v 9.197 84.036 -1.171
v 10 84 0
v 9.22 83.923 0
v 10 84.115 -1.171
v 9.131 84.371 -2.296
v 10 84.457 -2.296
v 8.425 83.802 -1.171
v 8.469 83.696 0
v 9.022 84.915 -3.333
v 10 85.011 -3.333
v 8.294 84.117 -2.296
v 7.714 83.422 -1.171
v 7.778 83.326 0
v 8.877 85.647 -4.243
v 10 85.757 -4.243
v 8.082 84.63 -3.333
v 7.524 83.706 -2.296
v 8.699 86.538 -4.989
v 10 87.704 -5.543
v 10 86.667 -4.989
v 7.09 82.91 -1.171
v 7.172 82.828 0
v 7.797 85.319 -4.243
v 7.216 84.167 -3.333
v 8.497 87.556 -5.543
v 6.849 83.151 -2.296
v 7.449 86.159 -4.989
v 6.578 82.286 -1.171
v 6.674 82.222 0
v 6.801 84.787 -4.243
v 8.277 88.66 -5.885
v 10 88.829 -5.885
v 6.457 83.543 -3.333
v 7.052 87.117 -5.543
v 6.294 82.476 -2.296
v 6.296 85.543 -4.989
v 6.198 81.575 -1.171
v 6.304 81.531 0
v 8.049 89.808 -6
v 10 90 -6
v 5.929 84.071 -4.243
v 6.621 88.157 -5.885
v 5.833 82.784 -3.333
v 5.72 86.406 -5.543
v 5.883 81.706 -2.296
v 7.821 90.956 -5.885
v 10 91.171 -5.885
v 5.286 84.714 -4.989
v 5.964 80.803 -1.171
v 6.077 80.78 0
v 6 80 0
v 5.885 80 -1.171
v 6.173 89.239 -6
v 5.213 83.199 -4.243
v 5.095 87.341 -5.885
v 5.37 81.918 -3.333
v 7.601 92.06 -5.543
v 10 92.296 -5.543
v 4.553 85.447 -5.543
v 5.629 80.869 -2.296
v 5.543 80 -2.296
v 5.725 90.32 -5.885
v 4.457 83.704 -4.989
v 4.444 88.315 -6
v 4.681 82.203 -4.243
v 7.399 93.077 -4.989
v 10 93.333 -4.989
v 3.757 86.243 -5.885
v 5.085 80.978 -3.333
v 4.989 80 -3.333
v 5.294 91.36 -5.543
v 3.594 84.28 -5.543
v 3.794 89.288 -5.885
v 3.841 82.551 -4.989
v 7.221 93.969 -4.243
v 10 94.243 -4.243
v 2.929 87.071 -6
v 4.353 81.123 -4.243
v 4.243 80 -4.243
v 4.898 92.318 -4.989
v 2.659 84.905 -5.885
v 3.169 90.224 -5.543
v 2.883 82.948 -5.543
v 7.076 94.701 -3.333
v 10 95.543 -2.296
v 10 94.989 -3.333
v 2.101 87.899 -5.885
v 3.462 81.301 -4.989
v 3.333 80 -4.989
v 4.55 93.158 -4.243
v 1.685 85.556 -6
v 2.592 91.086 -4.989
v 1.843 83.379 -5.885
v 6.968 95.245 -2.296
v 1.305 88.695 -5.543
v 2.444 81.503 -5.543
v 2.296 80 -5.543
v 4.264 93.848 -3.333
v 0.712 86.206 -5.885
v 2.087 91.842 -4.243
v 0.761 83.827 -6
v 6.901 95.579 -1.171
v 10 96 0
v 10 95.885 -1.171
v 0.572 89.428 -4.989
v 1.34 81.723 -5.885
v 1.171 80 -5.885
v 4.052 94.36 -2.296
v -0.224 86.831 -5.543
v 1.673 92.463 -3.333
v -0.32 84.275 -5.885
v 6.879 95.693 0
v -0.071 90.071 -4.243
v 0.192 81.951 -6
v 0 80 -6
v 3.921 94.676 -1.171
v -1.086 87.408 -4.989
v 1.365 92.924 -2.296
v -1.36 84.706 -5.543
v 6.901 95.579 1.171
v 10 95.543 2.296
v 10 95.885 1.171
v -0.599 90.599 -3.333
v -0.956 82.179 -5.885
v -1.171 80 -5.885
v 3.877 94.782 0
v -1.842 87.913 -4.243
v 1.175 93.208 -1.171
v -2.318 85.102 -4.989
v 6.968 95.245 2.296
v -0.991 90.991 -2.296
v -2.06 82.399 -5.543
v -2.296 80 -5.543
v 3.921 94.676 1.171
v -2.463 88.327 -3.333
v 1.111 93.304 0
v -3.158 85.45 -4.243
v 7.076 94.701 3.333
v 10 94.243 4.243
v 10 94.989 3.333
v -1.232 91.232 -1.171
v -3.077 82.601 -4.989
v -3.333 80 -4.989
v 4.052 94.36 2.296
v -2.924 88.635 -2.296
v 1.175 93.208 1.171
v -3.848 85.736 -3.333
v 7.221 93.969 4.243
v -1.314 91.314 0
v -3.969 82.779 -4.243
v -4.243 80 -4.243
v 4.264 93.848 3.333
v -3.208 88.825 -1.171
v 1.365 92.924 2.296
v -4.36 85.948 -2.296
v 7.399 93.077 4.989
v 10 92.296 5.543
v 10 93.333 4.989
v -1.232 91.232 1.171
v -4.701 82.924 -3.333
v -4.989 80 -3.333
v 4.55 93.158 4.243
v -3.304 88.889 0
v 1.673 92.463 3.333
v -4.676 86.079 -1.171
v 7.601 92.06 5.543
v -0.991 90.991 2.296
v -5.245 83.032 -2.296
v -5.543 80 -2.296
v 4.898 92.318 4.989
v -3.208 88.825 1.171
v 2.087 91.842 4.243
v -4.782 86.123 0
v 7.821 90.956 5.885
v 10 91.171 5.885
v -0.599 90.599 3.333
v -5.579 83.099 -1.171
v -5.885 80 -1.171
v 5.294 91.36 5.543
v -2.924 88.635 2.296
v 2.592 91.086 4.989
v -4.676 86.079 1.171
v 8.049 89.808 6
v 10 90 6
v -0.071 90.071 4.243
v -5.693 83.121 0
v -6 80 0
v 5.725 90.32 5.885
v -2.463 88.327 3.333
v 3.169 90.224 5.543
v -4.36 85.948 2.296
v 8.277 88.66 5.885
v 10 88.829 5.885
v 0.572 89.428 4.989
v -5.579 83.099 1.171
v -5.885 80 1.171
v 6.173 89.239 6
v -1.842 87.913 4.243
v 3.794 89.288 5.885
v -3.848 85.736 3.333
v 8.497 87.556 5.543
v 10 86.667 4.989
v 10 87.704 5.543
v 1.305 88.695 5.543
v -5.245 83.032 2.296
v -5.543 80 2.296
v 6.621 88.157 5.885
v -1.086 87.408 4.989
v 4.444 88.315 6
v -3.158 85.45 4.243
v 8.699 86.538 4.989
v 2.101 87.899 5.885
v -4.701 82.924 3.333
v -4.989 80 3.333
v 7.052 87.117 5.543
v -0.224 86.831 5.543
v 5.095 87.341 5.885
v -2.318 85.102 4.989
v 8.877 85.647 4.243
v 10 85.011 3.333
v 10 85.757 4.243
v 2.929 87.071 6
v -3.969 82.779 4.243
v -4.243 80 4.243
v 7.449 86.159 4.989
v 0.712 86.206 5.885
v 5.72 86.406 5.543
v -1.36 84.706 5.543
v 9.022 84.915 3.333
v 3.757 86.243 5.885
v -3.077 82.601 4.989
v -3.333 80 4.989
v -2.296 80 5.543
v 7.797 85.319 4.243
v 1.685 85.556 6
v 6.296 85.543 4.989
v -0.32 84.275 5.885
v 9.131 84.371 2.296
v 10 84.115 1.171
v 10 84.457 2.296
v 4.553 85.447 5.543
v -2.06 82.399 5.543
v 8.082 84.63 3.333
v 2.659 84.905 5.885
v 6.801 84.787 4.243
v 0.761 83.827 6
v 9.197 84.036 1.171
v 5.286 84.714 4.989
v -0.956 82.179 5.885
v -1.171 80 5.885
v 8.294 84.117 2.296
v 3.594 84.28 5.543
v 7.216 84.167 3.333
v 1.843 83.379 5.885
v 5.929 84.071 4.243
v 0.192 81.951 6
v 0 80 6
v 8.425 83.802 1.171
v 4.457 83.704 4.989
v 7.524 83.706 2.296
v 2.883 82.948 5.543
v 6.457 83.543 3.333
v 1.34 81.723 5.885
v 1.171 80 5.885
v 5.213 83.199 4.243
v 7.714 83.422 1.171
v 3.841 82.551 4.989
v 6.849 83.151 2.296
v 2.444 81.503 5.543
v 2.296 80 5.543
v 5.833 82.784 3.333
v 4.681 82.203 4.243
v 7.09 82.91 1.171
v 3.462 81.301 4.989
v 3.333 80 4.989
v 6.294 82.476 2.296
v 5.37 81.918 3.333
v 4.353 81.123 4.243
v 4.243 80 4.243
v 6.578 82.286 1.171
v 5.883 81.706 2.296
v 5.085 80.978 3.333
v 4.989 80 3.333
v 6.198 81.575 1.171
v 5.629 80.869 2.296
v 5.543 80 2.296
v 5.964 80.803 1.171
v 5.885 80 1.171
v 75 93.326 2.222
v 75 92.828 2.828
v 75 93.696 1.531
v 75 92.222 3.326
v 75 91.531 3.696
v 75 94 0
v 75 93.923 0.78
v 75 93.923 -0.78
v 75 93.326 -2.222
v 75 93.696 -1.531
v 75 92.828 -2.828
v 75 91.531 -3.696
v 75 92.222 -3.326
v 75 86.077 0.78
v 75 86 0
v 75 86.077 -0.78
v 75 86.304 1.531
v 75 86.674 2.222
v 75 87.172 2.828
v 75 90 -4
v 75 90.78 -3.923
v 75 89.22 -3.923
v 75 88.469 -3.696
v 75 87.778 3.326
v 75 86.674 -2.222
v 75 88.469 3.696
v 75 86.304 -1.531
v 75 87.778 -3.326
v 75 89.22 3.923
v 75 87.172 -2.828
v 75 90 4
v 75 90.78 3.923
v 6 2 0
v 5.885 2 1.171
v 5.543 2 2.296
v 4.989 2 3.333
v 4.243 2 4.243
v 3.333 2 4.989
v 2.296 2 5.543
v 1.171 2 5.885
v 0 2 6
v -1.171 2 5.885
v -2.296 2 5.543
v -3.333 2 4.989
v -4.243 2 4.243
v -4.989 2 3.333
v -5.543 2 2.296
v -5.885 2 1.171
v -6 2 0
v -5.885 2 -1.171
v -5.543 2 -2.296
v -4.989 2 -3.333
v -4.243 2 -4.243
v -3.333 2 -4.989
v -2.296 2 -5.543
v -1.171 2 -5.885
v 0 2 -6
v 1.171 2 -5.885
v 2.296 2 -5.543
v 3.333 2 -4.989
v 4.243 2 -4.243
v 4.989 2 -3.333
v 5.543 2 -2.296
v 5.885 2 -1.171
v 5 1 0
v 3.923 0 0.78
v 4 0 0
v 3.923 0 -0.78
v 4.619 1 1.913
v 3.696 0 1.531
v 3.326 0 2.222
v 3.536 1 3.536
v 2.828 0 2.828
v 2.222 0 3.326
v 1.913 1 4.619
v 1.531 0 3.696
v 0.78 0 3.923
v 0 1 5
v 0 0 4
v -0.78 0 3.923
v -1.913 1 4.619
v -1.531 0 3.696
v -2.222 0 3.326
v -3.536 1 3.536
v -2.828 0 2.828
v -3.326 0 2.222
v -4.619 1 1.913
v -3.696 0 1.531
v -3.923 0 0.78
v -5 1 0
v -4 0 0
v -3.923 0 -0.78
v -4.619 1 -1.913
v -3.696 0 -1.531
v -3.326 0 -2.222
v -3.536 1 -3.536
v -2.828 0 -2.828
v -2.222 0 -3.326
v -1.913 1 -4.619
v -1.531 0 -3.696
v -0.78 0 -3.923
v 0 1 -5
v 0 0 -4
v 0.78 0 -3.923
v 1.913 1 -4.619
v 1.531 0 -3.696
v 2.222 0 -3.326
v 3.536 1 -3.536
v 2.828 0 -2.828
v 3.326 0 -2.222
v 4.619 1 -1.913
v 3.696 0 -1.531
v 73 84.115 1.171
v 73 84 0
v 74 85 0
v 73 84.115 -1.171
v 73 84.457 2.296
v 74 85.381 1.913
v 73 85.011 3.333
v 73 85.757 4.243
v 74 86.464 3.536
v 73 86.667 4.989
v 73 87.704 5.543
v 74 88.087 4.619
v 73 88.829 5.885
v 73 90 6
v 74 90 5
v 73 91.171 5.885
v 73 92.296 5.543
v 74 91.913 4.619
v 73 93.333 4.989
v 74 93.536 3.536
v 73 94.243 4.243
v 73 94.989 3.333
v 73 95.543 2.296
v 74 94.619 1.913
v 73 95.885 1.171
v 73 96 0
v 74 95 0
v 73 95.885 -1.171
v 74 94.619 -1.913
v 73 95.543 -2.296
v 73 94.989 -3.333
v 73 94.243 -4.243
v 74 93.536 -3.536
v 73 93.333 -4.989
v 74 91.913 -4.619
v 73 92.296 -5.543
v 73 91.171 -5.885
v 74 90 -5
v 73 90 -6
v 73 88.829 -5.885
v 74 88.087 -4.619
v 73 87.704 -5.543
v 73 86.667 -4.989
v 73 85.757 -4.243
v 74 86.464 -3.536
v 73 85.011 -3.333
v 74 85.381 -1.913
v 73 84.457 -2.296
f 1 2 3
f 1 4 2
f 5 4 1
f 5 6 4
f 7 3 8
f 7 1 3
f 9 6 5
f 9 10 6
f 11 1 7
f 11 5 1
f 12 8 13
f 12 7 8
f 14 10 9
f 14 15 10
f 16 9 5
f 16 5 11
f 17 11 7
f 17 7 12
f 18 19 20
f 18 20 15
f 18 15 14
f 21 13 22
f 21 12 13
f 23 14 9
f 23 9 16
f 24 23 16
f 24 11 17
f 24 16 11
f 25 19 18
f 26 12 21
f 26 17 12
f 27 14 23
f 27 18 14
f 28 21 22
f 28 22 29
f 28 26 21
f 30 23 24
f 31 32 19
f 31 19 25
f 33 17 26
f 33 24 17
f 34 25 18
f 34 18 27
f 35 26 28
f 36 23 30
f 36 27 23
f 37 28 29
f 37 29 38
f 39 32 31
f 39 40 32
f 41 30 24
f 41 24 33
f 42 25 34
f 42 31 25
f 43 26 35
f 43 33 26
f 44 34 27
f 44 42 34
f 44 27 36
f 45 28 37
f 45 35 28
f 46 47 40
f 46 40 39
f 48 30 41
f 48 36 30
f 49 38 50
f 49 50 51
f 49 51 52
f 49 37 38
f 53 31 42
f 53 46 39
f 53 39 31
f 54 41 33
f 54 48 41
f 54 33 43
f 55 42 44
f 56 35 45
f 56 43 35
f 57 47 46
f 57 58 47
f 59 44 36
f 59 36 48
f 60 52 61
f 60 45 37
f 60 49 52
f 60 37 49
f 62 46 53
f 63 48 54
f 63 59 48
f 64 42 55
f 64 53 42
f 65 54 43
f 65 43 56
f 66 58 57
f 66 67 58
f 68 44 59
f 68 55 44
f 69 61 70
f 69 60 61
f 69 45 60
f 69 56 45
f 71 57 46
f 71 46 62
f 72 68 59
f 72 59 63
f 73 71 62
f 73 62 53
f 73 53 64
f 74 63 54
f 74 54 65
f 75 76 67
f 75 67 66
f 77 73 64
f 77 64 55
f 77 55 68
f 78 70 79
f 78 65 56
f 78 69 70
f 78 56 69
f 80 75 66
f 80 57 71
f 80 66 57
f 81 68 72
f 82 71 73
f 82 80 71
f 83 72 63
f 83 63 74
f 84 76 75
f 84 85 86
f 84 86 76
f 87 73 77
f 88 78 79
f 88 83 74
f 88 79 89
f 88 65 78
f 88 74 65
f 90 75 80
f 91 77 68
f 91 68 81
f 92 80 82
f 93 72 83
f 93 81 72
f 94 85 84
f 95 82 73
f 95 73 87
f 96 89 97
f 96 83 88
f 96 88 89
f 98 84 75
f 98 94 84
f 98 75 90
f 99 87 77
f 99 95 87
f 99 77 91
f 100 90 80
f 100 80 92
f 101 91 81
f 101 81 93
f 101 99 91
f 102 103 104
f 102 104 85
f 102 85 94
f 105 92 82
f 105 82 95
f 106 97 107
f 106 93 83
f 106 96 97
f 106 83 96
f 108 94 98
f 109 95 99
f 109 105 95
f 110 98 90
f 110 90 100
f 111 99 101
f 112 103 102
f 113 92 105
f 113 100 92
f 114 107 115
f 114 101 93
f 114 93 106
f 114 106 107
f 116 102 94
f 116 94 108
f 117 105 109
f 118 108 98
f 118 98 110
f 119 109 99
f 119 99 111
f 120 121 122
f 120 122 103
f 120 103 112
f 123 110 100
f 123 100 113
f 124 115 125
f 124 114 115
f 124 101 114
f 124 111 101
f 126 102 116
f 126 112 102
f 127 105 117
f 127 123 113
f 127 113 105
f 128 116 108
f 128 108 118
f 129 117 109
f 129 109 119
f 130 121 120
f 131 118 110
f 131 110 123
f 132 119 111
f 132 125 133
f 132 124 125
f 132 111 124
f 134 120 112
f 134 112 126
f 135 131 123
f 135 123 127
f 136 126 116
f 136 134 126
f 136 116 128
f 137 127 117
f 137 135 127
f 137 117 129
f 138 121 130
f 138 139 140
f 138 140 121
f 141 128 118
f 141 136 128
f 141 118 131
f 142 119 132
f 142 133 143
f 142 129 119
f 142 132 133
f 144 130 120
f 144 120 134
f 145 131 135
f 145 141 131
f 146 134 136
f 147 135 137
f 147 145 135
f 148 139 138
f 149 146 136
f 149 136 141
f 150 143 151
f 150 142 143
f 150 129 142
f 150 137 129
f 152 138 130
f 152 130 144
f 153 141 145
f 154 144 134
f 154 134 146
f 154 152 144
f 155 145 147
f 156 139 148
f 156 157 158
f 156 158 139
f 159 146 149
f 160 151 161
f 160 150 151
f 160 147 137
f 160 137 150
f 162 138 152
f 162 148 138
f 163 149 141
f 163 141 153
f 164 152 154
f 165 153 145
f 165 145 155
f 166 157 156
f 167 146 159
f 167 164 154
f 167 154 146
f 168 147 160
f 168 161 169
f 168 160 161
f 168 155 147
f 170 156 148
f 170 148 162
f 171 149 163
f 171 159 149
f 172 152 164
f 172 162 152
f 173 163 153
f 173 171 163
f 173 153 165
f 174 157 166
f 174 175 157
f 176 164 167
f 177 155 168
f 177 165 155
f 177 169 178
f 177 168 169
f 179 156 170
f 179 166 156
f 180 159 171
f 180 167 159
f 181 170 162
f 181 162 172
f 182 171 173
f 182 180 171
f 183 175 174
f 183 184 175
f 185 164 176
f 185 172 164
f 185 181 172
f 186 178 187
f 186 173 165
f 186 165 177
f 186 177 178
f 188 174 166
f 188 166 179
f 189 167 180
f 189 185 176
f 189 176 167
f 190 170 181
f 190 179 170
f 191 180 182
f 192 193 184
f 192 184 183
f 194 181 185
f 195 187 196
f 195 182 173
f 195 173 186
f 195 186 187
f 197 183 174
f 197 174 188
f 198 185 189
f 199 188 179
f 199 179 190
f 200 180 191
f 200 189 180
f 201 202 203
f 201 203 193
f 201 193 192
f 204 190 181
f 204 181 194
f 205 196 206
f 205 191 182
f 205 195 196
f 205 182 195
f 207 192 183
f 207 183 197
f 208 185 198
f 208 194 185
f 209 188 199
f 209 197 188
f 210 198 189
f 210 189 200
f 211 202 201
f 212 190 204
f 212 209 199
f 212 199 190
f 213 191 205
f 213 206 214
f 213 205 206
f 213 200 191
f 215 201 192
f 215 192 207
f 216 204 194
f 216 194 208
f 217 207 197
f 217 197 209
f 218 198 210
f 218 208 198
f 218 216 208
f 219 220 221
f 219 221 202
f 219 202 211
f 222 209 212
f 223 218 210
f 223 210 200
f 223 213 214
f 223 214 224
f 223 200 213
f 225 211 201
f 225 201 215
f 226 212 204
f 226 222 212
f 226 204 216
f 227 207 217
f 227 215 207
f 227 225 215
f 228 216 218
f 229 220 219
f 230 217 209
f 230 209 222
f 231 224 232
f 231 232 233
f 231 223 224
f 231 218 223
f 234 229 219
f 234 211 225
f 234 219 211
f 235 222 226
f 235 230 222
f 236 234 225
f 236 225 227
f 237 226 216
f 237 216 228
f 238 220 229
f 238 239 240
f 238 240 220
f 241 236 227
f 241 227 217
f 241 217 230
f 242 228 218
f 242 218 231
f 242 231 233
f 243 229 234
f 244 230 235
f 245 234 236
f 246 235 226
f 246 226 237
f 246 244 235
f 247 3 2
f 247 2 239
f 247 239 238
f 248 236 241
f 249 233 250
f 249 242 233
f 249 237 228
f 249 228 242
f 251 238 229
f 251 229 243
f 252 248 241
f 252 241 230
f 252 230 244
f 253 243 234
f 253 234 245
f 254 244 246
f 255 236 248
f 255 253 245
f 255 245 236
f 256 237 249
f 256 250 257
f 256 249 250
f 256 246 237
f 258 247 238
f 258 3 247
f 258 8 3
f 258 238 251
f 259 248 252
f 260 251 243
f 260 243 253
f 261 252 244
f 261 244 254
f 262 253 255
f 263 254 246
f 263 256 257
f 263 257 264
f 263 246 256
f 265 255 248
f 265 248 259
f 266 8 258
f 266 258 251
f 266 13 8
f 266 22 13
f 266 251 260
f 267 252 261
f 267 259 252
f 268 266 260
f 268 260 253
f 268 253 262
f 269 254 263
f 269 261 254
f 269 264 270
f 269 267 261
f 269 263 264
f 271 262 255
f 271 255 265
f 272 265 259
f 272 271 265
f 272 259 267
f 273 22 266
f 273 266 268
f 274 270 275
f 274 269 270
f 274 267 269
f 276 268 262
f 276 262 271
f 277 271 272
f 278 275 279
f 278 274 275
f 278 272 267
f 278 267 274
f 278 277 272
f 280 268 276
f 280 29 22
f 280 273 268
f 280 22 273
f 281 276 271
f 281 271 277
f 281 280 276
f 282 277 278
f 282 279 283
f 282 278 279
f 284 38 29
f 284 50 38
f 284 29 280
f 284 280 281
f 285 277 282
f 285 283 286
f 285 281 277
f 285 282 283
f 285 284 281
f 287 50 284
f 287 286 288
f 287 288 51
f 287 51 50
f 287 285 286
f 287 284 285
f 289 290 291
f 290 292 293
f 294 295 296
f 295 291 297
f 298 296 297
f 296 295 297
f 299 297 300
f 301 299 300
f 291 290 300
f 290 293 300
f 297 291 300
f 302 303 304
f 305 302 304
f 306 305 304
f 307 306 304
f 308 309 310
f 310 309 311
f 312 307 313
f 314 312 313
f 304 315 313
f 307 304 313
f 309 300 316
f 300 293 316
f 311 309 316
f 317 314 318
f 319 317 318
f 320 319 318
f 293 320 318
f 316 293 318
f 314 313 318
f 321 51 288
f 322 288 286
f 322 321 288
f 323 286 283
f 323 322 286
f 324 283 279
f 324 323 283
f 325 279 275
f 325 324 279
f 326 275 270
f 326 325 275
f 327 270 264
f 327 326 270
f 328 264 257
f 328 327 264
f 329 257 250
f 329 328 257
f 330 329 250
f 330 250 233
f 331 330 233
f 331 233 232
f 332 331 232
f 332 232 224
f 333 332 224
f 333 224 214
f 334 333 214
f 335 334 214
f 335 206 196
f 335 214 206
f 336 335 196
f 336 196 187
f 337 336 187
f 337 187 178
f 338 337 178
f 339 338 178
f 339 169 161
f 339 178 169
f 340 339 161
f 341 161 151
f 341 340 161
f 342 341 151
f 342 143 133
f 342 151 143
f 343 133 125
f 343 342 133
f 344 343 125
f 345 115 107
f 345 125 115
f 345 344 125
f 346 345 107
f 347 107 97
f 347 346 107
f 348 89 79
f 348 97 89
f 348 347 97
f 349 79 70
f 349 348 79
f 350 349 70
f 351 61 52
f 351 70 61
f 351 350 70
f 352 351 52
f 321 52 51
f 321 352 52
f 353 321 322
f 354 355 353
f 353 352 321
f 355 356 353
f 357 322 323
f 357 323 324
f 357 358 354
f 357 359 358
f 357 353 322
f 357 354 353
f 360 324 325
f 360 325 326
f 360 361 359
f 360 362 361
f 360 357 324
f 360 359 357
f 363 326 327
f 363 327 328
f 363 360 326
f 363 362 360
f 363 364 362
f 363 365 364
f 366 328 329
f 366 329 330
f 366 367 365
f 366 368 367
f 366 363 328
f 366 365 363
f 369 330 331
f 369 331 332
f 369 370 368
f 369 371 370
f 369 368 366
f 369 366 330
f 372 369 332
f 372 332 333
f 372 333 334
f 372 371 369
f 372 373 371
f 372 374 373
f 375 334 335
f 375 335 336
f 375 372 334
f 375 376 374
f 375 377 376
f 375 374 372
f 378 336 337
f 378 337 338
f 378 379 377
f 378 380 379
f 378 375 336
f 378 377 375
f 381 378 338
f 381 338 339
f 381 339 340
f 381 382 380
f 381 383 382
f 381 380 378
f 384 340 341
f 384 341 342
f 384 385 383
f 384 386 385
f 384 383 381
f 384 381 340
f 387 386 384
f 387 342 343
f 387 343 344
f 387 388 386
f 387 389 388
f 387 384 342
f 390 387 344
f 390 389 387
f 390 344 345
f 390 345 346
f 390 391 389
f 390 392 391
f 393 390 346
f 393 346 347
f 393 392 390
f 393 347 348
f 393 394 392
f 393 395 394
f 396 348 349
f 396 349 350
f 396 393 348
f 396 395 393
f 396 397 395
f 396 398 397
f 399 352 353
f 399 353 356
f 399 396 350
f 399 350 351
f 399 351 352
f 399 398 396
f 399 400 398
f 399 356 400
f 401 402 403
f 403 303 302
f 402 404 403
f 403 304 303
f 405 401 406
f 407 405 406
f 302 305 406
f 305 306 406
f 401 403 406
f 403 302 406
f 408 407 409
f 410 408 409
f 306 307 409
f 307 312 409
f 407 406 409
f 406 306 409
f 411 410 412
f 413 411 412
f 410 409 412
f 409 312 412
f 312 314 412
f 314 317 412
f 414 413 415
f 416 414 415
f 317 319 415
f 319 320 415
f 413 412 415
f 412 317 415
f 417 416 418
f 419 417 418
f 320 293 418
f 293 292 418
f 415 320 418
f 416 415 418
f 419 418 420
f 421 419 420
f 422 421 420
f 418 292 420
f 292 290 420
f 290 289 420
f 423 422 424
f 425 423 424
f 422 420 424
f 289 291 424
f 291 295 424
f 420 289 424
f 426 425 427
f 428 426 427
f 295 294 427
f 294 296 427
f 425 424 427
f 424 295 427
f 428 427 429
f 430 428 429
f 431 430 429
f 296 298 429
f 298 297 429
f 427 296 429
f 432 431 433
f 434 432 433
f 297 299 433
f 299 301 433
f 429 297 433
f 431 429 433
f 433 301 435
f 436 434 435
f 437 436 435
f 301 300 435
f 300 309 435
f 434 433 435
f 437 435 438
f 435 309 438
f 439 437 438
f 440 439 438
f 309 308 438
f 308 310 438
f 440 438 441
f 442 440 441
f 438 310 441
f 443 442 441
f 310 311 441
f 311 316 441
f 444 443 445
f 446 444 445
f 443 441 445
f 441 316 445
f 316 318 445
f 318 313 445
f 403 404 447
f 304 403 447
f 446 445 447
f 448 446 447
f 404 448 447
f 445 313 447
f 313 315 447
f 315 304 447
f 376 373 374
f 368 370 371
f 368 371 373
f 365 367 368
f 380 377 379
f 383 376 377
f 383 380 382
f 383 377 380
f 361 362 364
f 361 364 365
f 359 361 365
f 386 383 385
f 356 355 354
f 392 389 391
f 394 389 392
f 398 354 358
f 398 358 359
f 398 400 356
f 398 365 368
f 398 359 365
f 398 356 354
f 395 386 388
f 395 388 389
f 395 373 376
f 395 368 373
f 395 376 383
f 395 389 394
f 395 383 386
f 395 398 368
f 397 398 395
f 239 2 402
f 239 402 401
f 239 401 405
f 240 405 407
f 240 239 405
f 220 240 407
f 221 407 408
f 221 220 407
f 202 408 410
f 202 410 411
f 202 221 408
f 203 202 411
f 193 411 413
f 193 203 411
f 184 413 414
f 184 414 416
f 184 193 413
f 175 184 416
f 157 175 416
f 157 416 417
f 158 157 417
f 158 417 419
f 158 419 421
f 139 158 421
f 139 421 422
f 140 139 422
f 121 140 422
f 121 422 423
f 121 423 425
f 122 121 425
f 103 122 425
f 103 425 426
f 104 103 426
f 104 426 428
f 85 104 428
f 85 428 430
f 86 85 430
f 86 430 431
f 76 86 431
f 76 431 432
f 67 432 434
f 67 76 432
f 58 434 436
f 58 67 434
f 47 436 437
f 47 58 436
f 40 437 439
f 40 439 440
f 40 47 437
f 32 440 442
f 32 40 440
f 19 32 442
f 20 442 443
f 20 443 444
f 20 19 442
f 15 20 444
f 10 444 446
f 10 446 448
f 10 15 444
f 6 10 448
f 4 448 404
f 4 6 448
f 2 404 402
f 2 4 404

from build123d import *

# Parameters (mm, degrees)
SWEEP1_PROFILE_R = 6
CHAMFER1_SIZE    = 2


with BuildPart() as part:
    # Sweep1: sweep along a path in Sketch1
    with BuildLine(Plane.XY) as sweep1_path:
        Line((75, 90), (10, 90))
        ThreePointArc((10, 90), (2.928932188, 87.071067812), (0, 80))
        Line((0, 80), (0, 0))
    # Sweep1 profile (on start of the path) → Sweep1 (sweep)
    with BuildSketch(Plane(origin=(75, 90, 0), x_dir=(0, -1, 0), z_dir=(-1, 0, 0))):
        Circle(SWEEP1_PROFILE_R)
    sweep(path=sweep1_path.line)

    # Chamfer1
    chamfer1_edges = [part.edges().sort_by_distance(p)[0] for p in [
        (-6, 0, 0),
        (75, 96, 0),
    ]]
    chamfer(chamfer1_edges, length=CHAMFER1_SIZE)


solid = part.part
